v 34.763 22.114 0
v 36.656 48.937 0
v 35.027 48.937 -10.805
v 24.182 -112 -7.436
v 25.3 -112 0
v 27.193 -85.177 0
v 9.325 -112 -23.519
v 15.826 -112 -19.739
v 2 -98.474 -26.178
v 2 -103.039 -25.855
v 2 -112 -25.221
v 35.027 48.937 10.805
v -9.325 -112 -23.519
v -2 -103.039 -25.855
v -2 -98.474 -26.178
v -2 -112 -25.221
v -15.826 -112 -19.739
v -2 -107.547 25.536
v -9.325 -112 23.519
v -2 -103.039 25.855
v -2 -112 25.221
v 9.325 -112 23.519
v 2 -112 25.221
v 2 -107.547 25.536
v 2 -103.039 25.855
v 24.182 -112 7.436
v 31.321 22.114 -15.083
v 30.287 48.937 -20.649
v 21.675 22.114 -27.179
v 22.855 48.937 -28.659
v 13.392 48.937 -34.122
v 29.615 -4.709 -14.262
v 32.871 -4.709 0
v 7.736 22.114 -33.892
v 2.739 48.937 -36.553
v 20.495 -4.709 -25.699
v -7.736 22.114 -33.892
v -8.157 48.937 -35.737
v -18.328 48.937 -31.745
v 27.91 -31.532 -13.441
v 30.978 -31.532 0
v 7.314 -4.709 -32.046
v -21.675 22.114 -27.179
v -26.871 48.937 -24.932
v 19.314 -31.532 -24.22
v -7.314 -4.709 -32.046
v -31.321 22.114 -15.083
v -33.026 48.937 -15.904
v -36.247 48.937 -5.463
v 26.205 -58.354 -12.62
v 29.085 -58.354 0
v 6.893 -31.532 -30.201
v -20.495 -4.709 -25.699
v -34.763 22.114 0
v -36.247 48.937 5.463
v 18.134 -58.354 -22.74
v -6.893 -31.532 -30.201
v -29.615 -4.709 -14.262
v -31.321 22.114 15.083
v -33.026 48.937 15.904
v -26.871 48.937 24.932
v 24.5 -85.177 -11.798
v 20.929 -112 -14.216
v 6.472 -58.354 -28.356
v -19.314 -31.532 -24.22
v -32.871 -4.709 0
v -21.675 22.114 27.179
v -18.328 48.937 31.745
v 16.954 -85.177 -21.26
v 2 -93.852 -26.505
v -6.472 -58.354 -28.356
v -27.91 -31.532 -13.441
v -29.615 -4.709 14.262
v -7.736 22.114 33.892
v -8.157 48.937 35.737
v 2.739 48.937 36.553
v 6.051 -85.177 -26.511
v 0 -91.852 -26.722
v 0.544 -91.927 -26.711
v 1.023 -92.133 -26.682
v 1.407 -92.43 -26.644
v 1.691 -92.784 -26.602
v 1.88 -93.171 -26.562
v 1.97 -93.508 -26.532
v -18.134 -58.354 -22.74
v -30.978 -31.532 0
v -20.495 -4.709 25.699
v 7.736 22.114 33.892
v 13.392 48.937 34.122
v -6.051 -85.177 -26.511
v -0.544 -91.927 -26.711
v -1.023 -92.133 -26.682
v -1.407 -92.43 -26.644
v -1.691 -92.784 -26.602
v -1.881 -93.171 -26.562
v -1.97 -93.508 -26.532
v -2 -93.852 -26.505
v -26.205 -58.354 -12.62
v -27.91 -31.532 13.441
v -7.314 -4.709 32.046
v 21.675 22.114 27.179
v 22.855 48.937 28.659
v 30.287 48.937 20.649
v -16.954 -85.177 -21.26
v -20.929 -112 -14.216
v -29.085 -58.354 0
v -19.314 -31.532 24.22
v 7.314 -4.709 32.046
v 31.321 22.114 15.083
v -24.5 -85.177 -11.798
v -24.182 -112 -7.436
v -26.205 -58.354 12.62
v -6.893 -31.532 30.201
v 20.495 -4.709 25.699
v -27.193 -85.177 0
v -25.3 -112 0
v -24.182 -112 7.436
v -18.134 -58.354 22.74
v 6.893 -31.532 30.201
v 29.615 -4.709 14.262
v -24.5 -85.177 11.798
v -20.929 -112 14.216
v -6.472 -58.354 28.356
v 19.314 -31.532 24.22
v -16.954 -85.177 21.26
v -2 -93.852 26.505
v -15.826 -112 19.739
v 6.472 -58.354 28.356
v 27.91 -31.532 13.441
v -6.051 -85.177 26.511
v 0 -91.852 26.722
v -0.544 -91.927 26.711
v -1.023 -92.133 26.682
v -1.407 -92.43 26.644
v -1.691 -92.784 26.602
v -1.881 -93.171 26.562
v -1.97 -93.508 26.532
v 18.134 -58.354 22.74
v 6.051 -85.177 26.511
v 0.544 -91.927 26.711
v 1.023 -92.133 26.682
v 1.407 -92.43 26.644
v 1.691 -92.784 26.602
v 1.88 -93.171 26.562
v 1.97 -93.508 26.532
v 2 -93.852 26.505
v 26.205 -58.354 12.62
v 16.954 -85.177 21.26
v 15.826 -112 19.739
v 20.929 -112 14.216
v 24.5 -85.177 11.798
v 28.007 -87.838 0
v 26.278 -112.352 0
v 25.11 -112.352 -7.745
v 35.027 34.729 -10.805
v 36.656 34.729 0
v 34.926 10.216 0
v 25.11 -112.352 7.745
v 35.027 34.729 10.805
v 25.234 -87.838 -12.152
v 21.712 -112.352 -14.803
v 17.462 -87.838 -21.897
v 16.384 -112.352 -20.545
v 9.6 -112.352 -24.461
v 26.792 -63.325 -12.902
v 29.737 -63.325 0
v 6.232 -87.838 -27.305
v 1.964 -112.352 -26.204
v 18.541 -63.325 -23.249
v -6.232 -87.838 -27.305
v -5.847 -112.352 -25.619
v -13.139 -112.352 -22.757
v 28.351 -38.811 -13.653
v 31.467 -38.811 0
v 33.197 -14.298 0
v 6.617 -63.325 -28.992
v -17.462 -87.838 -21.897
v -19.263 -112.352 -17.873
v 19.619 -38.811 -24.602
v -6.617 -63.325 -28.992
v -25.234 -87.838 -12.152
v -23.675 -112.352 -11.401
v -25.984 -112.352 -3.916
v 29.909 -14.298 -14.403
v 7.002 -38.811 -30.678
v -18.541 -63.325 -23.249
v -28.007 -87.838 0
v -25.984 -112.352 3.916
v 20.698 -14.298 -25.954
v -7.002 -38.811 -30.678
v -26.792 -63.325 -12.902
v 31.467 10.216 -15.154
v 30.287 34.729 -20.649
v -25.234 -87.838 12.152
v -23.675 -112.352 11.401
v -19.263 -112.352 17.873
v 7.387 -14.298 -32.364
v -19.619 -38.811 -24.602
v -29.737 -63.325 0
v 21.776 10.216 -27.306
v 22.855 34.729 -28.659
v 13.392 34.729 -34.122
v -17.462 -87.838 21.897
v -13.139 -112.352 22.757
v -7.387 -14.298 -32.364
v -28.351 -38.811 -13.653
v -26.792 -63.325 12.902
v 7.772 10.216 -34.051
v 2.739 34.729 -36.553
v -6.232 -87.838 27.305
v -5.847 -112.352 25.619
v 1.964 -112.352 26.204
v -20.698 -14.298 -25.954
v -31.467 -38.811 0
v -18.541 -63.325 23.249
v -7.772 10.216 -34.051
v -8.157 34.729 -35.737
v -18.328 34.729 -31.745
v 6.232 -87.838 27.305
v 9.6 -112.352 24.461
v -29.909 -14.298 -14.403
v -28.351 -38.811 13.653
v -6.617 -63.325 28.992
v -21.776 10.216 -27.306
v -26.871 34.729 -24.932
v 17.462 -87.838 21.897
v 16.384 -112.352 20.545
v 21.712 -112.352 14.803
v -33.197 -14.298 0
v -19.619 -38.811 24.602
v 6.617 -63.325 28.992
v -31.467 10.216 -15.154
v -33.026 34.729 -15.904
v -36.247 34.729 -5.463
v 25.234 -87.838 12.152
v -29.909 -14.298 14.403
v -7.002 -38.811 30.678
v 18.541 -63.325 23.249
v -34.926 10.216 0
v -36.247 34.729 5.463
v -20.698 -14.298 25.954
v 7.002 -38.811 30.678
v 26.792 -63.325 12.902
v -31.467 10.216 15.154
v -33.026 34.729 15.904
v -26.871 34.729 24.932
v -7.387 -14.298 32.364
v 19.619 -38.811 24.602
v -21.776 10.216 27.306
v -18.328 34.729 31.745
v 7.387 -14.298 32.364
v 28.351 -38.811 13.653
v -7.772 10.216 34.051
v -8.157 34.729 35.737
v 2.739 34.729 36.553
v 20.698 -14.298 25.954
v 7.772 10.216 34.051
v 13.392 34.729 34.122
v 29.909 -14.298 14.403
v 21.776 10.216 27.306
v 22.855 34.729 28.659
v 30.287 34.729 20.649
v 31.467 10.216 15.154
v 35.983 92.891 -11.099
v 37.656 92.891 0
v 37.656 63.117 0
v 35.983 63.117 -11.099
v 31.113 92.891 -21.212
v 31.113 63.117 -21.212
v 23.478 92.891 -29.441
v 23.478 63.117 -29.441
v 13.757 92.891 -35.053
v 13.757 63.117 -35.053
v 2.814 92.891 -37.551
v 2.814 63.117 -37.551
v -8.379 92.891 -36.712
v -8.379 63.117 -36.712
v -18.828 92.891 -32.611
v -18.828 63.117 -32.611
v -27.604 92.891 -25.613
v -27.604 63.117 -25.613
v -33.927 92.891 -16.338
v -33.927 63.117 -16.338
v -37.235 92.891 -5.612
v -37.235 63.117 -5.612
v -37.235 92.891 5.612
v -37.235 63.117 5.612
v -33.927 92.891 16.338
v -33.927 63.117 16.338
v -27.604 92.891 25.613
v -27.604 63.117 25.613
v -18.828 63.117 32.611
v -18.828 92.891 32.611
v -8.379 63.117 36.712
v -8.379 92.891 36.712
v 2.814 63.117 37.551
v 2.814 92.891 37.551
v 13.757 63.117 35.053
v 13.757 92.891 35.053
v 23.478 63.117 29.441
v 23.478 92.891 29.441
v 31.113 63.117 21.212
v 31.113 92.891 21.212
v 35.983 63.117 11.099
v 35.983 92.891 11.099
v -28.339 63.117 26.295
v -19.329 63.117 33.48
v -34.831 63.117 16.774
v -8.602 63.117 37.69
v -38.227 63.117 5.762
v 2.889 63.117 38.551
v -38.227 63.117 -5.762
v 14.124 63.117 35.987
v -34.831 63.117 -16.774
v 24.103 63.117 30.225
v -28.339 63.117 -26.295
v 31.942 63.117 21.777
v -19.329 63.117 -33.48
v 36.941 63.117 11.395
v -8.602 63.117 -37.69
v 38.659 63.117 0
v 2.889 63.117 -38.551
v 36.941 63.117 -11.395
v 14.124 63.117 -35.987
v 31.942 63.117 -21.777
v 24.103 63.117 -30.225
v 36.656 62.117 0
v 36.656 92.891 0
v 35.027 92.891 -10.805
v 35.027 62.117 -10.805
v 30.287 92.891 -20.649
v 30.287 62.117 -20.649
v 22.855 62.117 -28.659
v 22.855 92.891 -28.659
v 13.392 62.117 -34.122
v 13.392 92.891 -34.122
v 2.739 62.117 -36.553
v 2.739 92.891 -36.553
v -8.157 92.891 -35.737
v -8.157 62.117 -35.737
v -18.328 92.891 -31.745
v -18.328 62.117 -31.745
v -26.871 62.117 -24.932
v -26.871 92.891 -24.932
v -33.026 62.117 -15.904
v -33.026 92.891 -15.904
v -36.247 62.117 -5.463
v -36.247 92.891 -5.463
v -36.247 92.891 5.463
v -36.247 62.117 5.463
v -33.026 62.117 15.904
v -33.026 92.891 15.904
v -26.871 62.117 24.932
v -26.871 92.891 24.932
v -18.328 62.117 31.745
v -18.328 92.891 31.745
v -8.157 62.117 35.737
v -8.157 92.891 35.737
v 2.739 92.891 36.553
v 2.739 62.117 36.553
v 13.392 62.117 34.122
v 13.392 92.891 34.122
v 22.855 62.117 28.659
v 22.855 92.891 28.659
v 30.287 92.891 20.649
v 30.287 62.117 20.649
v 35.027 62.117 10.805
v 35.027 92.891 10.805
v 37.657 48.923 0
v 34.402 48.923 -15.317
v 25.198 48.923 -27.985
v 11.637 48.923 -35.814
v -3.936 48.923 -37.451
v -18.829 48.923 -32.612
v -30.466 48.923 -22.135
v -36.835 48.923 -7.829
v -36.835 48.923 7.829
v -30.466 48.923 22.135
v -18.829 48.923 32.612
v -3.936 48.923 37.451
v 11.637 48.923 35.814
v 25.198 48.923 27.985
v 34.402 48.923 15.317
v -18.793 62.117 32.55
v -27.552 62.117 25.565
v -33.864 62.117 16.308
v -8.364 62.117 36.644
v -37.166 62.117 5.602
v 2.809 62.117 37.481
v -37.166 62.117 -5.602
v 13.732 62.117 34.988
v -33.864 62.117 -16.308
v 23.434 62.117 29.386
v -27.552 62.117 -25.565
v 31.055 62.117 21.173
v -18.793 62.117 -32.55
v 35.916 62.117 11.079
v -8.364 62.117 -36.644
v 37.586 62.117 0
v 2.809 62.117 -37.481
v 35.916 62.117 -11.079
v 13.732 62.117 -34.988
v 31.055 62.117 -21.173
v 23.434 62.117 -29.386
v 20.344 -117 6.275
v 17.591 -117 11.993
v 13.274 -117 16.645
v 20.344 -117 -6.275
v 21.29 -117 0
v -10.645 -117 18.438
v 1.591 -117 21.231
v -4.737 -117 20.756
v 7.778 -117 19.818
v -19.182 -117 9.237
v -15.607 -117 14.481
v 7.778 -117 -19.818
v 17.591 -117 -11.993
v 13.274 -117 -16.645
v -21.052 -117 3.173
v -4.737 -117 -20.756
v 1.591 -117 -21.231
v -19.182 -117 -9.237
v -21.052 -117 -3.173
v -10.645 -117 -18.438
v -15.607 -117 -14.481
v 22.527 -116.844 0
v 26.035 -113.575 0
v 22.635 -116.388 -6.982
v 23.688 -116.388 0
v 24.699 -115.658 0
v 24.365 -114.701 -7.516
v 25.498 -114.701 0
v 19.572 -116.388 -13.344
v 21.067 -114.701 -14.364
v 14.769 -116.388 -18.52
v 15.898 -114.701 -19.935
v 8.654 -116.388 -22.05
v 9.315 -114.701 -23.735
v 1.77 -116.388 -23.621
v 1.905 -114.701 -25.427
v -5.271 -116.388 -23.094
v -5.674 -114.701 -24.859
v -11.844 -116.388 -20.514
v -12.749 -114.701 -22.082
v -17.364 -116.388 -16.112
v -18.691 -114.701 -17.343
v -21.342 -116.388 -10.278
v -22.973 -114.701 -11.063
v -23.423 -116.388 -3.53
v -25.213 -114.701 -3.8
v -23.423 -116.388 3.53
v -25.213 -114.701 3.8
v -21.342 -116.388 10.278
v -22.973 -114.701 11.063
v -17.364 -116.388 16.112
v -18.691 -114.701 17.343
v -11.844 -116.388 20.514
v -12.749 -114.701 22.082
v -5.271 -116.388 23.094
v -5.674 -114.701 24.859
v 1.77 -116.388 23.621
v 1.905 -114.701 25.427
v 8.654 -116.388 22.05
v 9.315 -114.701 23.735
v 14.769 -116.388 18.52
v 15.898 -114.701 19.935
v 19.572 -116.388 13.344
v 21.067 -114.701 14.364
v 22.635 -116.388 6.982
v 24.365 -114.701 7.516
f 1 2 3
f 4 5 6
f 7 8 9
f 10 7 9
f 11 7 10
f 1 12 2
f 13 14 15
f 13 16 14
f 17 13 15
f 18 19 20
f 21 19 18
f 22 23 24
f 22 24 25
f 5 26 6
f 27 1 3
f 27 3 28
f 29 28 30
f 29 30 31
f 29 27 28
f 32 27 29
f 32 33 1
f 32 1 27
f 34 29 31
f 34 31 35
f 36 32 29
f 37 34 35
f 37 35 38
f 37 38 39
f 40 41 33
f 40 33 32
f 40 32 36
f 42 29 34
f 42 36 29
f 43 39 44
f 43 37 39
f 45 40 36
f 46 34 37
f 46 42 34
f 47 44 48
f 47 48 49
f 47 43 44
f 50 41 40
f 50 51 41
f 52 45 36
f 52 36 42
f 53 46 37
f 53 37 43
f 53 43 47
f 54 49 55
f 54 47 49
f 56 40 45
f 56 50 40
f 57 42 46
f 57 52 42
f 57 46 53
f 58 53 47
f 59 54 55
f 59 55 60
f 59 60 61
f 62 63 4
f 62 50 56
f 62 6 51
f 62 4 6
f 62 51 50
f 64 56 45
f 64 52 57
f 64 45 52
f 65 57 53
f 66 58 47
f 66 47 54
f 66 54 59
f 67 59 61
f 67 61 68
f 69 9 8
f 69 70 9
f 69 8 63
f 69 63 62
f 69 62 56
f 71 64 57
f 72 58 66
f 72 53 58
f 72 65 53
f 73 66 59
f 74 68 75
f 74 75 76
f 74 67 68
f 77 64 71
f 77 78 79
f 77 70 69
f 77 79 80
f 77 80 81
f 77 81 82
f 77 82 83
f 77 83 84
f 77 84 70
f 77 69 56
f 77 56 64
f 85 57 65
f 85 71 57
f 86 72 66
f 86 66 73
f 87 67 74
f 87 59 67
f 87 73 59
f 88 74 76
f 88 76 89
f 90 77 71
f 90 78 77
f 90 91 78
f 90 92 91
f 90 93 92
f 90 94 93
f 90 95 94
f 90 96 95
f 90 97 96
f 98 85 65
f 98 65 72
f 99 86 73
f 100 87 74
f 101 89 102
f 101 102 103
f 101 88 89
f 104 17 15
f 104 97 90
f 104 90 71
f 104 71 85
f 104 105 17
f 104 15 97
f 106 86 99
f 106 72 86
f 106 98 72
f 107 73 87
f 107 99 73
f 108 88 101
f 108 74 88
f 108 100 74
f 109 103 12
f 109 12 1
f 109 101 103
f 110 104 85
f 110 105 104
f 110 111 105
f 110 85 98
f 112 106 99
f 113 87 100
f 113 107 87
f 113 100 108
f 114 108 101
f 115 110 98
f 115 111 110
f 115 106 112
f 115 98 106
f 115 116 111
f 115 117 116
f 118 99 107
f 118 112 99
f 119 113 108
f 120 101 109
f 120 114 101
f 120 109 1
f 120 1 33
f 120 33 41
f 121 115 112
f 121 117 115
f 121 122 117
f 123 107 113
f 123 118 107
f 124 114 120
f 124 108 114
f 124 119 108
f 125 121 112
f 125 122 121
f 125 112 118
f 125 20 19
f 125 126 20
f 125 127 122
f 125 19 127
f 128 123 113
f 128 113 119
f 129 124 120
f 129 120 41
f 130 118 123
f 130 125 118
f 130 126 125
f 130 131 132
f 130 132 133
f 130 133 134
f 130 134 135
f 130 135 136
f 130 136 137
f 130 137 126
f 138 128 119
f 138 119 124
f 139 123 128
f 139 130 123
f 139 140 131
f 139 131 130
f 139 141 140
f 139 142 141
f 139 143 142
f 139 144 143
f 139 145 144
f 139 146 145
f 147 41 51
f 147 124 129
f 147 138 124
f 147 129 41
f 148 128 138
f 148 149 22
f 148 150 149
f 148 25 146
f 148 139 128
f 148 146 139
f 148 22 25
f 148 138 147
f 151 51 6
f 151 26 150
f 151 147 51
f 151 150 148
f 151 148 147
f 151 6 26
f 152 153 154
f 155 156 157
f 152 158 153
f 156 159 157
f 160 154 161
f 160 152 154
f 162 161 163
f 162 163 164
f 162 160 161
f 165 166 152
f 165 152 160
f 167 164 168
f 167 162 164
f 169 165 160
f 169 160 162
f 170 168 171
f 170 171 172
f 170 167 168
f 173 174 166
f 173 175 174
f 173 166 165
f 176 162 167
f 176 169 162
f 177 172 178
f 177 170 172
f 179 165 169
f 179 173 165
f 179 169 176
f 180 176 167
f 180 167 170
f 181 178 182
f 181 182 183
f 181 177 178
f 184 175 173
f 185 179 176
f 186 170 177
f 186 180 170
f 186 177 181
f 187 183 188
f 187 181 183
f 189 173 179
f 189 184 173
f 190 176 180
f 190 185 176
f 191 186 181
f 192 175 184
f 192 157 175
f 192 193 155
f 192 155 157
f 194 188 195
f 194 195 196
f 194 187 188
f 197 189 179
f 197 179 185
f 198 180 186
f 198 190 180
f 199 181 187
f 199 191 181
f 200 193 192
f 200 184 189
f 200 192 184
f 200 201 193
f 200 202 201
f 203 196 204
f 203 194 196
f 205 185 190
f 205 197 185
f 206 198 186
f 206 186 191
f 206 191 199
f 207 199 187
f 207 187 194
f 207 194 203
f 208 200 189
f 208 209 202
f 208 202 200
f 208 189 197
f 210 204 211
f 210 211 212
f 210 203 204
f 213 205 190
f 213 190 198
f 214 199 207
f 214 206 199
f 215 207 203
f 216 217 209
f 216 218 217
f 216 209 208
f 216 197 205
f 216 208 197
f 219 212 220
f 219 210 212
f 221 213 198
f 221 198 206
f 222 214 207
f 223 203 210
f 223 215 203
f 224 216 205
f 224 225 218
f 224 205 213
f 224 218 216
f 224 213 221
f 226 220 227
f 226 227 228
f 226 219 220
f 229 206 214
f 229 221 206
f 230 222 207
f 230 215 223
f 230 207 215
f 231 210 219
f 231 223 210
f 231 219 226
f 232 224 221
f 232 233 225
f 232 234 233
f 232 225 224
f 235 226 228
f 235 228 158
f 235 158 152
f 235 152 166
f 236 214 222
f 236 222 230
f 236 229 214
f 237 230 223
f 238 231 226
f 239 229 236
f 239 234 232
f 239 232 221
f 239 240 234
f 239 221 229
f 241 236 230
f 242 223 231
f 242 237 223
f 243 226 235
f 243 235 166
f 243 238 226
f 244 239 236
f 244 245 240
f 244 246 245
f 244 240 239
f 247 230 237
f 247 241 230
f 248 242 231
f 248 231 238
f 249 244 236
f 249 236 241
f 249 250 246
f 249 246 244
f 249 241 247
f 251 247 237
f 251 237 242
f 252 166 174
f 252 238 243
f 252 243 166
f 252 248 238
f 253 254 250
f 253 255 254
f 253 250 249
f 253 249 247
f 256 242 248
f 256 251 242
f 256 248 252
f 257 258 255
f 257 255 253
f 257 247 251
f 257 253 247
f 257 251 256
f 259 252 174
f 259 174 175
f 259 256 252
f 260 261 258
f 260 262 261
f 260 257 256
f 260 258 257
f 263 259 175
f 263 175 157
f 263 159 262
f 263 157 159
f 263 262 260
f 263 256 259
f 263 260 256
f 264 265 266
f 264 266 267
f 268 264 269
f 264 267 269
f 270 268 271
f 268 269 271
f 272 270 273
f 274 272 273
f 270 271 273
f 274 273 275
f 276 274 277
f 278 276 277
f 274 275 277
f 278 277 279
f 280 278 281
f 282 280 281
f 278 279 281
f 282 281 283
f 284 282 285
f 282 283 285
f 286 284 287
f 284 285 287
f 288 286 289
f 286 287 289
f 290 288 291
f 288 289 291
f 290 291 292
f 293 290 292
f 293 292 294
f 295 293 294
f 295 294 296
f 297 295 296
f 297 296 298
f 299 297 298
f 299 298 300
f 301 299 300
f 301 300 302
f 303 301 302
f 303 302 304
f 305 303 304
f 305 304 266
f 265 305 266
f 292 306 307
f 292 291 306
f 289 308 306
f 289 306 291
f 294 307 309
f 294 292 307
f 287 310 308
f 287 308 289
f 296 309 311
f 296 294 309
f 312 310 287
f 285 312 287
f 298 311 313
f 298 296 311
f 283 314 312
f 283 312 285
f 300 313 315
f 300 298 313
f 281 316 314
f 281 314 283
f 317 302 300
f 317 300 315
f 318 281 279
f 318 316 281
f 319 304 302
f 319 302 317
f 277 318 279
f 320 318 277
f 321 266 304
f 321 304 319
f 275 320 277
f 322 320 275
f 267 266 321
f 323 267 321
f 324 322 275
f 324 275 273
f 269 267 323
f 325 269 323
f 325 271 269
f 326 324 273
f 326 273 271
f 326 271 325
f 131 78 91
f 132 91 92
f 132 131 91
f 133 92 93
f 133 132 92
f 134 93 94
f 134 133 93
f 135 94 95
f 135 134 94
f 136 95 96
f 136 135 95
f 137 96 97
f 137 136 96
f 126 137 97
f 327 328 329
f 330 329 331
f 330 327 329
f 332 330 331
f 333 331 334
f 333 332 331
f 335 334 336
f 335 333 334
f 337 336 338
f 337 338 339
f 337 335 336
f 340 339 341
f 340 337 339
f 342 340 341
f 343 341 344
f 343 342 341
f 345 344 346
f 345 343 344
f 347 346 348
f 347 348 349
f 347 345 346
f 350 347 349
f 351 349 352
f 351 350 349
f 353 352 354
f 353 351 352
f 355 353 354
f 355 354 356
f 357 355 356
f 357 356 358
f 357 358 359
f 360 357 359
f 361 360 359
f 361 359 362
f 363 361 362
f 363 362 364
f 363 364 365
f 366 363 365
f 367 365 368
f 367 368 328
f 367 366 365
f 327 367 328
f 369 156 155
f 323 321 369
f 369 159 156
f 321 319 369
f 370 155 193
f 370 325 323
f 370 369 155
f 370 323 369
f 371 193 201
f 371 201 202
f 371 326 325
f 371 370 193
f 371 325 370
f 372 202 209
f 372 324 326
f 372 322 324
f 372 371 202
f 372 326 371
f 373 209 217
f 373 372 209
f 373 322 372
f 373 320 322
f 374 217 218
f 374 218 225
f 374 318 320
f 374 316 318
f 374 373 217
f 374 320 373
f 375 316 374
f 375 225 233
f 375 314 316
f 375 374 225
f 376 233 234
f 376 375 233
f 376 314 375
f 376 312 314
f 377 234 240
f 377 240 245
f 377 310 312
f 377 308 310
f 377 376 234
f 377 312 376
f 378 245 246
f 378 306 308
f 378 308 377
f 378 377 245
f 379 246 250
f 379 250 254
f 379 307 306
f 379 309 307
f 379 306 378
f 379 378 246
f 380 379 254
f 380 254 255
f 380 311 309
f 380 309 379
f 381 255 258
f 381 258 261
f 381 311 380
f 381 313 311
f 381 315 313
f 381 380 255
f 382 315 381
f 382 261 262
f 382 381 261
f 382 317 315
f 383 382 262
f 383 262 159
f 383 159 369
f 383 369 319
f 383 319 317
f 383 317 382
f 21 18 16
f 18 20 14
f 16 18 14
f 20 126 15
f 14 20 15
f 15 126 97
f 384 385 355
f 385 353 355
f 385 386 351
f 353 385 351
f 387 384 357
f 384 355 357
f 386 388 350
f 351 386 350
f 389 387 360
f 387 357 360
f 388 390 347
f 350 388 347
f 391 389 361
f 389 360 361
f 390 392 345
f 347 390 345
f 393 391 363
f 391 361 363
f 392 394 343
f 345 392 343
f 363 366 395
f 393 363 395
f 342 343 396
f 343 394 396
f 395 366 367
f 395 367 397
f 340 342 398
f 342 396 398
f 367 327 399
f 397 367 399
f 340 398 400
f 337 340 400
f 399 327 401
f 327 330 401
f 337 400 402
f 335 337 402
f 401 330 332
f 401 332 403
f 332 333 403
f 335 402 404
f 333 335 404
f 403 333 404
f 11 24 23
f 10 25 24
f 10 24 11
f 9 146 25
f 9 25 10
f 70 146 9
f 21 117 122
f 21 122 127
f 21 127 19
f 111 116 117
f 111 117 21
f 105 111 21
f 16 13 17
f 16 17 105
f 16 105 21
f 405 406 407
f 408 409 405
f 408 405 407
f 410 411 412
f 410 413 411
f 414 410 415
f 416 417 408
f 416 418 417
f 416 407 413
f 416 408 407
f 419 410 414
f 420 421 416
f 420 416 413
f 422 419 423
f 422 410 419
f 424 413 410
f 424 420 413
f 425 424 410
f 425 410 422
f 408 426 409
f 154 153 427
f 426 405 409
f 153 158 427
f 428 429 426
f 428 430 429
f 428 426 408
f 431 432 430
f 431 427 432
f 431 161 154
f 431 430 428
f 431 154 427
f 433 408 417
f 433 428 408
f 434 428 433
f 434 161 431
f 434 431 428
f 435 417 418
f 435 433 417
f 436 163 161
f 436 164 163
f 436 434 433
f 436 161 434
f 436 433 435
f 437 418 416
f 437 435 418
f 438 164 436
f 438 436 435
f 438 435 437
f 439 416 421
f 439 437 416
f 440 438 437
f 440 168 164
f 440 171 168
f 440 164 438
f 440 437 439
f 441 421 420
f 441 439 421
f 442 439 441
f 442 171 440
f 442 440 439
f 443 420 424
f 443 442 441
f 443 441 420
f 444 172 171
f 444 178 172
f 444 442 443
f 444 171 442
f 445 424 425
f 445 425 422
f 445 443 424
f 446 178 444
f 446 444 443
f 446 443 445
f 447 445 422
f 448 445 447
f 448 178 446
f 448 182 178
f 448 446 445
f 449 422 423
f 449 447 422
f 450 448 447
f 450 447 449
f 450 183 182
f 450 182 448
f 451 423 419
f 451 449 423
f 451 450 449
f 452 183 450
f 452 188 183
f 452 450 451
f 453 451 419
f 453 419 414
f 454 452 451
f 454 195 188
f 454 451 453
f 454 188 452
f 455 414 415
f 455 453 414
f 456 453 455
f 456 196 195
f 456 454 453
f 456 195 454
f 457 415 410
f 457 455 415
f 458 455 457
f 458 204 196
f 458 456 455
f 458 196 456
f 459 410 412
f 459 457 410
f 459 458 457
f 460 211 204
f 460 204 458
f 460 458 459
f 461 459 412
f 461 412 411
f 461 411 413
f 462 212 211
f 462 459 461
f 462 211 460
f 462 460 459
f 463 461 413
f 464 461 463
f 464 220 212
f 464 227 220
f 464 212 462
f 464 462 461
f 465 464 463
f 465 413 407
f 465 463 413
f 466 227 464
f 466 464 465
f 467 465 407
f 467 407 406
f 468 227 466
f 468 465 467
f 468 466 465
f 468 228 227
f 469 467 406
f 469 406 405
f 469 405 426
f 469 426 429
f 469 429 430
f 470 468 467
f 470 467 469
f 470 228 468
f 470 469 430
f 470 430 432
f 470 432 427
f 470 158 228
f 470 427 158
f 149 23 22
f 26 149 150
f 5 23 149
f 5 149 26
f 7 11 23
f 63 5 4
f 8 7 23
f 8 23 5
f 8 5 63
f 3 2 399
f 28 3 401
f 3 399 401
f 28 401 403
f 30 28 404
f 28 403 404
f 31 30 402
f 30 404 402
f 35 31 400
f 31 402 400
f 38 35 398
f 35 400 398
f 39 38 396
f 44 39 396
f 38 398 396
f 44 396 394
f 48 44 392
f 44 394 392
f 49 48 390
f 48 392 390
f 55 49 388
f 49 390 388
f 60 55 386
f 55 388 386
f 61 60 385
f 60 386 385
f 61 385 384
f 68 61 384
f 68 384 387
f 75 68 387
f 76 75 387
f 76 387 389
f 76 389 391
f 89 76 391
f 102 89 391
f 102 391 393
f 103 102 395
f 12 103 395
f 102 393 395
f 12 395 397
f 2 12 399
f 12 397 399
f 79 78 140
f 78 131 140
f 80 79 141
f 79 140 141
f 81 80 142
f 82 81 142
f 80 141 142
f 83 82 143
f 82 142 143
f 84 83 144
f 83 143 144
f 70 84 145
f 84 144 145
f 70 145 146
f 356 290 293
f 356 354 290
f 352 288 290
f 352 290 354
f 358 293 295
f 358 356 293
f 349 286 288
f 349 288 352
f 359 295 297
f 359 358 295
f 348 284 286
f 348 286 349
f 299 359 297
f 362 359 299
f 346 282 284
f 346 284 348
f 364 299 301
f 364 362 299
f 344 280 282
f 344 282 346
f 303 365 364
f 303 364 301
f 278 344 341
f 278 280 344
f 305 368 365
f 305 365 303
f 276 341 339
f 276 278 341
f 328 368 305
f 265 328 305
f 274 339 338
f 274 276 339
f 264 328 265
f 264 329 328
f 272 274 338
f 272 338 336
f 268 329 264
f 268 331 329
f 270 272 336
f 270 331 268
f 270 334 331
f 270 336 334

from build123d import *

# Parameters (mm, degrees)
BODY_START                   = 62.116699477
BODY_SHELL_OUTLINE_R         = 36.655940115
BODY_SHELL_DEPTH             = 30.774237315
BODY_SHELL_2_OUTLINE_R       = 37.655940115
BODY_SHELL_2_OUTLINE_R_2     = 36.655940115
BODY_SHELL_2_DEPTH           = 30.774237315
BASE_FILLET_R                = 5
PARTITION_EXTRUDE_DEPTH      = 2
PARTITION_EXTRUDE_DEPTH_BACK = 2
PARTITION_FILLET_1_R         = 2
PARTITION_FILLET_2_R         = 2


with BuildPart() as part:
    # Body Sketch → Body revolve (revolve)
    with BuildSketch(Plane.XY):
        Polygon((0, 0), (0, -112), (-25.3, -112), (-37.585940115, 62.116699477), (-36.655940115, 62.116699477), (-36.655940115, 92.890936792), (0, 92.890936792), align=None)
    revolve(axis=Axis((0, 0, 0), (0, -1, 0)))

    # Body Shell: read off the stored shape, not the designer's step
    # Body Shell outline → Body Shell (cut)
    with BuildSketch(Plane(origin=(0, 0, 0), x_dir=(1, 0, 0), z_dir=(0, 1, 0)).offset(BODY_START)):
        Circle(BODY_SHELL_OUTLINE_R)
    extrude(amount=BODY_SHELL_DEPTH, mode=Mode.SUBTRACT)

    # Body Shell 2 outline → Body Shell 2 (add)
    with BuildSketch(Plane(origin=(0, 0, 0), x_dir=(1, 0, 0), z_dir=(0, 1, 0)).offset(BODY_START)):
        Circle(BODY_SHELL_2_OUTLINE_R)
        Circle(BODY_SHELL_2_OUTLINE_R_2, mode=Mode.SUBTRACT)
    extrude(amount=BODY_SHELL_2_DEPTH)

    # Body Shell 3 outline → Body Shell 3 (revolve, cut)
    with BuildSketch(Plane.XY):
        Polygon((0, 62.116699477), (0, -117), (25.949678741, -117), (36.655940115, 34.729446569), (36.655940115, 62.116699477), align=None)
    revolve(axis=Axis((0, 0, 0), (0, 1, 0)), mode=Mode.SUBTRACT)

    # Body Shell 4 outline → Body Shell 4 (revolve)
    with BuildSketch(Plane.XY):
        Polygon((36.655940115, 62.116699477), (36.655940115, 34.729446569), (38.658988015, 63.116699477), (37.655940115, 63.116699477), (37.655940115, 62.116699477), align=None)
    revolve(axis=Axis((0, 0, 0), (0, 1, 0)))

    # Body Shell 5 outline → Body Shell 5 (revolve, cut)
    with BuildSketch(Plane.XY):
        Polygon((36.655940115, 62.116699477), (36.655940115, 48.936712516), (37.585940115, 62.116699477), align=None)
    revolve(axis=Axis((0, 0, 0), (0, 1, 0)), mode=Mode.SUBTRACT)

    # Body Shell 6 outline → Body Shell 6 (revolve)
    with BuildSketch(Plane.XY):
        Polygon((0, -112), (0, -117), (25.949678741, -117), (36.655940115, 34.729446569), (36.655940115, 48.936712516), (25.3, -112), align=None)
    revolve(axis=Axis((0, 0, 0), (0, 1, 0)))

    # Base Fillet
    base_fillet_edges = [part.edges().sort_by_distance(p)[0] for p in [
        (-25.949678741, -117, 0),
    ]]
    fillet(base_fillet_edges, radius=BASE_FILLET_R)

    # Partition Sketch → Partition Extrude (add, two sides: drawn at the far end of the back side and taken through both)
    with BuildSketch(Plane(origin=(0, 0, 0), x_dir=(0, 0, -1), z_dir=(1, 0, 0)).offset(-PARTITION_EXTRUDE_DEPTH_BACK)):
        Polygon((-25.32, -112.351932597), (25.32, -112.351932597), (26.77, -91.851932597), (-26.77, -91.851932597), align=None)
    extrude(amount=PARTITION_EXTRUDE_DEPTH + PARTITION_EXTRUDE_DEPTH_BACK)

    # Partition Fillet 1
    partition_fillet_1_edges = [part.edges().sort_by_distance(p)[0] for p in [
        (2, -91.851932597, 0),
    ]]
    fillet(partition_fillet_1_edges, radius=PARTITION_FILLET_1_R)

    # Partition Fillet 2
    partition_fillet_2_edges = [part.edges().sort_by_distance(p)[0] for p in [
        (-2, -91.851932597, 0),
    ]]
    fillet(partition_fillet_2_edges, radius=PARTITION_FILLET_2_R - 0.0001)  # a hair under: the kernel refuses the full size


solid = part.part
